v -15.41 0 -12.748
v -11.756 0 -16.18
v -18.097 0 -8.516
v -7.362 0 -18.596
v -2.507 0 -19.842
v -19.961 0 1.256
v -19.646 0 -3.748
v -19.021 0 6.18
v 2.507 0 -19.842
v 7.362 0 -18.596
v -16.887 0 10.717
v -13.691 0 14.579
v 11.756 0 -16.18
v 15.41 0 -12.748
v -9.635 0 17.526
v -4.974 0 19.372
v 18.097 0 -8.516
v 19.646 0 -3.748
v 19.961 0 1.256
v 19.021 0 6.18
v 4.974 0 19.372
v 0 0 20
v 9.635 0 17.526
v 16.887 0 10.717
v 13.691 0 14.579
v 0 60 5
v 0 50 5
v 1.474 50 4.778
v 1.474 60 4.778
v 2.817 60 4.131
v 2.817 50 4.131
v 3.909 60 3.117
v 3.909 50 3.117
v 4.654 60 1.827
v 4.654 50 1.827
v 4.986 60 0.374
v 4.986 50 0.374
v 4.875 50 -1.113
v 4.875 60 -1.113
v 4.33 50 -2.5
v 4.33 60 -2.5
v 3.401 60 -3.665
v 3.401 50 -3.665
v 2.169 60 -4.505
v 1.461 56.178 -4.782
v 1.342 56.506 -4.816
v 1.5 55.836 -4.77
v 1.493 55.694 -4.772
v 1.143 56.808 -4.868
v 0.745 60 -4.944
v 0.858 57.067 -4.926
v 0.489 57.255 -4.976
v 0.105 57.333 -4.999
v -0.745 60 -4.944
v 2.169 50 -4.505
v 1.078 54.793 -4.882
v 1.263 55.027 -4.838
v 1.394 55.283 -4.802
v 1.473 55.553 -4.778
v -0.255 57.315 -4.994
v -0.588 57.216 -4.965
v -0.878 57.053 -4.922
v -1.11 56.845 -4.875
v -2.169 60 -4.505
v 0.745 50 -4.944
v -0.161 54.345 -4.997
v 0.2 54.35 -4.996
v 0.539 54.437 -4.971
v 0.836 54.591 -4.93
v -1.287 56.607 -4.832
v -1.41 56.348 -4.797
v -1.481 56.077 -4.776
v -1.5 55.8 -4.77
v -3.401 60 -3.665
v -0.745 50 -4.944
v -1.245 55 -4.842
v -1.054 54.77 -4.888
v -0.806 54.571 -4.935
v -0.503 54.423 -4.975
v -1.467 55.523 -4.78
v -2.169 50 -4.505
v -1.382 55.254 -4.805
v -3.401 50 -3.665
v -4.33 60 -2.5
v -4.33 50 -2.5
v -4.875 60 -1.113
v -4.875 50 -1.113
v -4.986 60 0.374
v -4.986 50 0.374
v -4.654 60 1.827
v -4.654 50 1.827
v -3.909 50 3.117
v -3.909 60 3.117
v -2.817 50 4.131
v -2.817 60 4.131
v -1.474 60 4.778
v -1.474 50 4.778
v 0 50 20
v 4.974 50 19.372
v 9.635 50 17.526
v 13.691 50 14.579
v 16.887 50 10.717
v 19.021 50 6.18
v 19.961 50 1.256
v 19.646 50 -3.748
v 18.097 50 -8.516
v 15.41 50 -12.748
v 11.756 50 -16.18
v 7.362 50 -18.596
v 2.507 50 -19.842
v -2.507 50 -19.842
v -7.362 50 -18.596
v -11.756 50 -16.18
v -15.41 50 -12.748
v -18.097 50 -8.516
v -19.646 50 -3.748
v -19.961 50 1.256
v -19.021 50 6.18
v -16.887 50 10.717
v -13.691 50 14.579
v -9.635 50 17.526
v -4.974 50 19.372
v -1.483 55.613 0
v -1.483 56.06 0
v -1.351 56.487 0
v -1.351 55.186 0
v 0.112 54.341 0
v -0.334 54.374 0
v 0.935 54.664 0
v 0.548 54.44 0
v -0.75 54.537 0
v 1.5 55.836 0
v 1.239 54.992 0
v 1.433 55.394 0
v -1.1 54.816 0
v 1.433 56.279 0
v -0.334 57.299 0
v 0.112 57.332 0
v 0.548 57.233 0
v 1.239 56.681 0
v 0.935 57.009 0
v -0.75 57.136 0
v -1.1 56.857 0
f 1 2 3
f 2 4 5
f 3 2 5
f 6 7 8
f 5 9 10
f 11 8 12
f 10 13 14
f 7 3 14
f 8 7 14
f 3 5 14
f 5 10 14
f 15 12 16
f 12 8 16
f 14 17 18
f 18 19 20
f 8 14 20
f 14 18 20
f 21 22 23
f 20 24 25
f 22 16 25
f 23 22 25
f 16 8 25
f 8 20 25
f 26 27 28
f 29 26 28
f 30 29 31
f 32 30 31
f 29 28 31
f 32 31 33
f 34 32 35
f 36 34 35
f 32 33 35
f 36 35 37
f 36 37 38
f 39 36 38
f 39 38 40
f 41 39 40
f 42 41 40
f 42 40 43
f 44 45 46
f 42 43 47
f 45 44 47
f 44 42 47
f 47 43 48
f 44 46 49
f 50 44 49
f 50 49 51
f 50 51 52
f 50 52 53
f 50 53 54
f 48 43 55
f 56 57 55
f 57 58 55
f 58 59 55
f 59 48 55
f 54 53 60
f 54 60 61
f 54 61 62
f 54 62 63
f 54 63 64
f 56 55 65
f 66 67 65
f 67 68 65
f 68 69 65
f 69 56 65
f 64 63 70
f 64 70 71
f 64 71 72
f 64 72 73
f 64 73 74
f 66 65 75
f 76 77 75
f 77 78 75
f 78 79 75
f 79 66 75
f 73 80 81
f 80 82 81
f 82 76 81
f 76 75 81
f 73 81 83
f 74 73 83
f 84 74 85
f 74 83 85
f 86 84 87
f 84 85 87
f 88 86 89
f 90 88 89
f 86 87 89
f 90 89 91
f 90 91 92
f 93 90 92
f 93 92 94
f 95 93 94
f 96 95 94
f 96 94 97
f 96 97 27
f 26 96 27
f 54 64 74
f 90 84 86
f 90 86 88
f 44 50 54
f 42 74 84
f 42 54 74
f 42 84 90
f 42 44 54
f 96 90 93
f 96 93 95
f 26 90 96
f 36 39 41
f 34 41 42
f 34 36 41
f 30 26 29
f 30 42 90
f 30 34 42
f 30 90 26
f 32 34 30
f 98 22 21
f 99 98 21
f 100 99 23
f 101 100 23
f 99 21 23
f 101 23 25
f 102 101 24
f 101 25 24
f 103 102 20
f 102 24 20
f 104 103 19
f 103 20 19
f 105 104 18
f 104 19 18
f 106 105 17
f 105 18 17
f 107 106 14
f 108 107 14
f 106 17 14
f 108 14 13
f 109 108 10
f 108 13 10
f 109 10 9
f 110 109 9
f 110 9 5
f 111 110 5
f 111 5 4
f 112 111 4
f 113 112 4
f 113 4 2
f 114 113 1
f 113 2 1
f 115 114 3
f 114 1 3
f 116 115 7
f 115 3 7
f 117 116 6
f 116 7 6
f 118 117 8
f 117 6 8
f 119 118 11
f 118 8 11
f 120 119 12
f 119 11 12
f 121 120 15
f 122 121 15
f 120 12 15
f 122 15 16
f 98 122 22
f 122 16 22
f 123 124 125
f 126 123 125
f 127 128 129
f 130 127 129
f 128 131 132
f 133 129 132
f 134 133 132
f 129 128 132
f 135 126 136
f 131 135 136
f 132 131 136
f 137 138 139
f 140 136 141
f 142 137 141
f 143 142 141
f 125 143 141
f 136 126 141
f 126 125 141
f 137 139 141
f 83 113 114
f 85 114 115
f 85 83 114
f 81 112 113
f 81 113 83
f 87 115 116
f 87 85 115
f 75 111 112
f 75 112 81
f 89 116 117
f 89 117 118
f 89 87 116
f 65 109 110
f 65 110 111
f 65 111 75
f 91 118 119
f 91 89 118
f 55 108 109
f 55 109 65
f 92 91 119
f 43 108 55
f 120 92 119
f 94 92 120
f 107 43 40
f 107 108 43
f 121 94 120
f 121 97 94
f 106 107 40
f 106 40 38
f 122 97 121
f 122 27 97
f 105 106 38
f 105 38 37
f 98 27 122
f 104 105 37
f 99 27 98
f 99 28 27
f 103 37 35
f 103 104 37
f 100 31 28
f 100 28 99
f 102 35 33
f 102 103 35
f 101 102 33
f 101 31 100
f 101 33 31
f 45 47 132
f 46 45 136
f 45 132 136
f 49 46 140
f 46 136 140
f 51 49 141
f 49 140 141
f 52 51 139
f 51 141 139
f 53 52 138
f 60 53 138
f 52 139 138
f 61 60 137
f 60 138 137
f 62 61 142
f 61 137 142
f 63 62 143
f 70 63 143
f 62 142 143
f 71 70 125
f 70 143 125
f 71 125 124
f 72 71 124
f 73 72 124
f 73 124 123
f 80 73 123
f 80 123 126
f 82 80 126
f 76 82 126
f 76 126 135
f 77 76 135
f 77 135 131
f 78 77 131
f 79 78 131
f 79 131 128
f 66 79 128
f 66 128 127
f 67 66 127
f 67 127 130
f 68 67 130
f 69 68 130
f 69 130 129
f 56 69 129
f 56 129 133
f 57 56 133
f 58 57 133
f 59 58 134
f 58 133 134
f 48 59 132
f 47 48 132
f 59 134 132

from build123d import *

# Parameters (mm, degrees)
SKETCH1_R           = 20
BOSS_EXTRUDE1_DEPTH = 50
SKETCH2_R           = 5
BOSS_EXTRUDE2_DEPTH = 10
SKETCH3_R           = 1.5
CUT_EXTRUDE1_DEPTH  = 16


with BuildPart() as part:
    # Sketch1 → Boss-Extrude1 (new body)
    with BuildSketch(Plane(origin=(0, 0, 0), x_dir=(1, 0, 0), z_dir=(0, 1, 0))):
        with Locations(Location((0, 0, 0), (0, 0, 270))):
            Circle(SKETCH1_R)
    extrude(amount=BOSS_EXTRUDE1_DEPTH)

    # Sketch2 → Boss-Extrude2 (add)
    with BuildSketch(Plane(origin=(0, 50, 0), x_dir=(1, 0, 0), z_dir=(0, 1, 0))):
        with Locations(Location((0, 0, 0), (0, 0, 270))):
            Circle(SKETCH2_R)
    extrude(amount=BOSS_EXTRUDE2_DEPTH)

    # Sketch3 → Cut-Extrude1 (cut)
    with BuildSketch(Plane.XY):
        with Locations((0, 55.836490144)):
            Circle(SKETCH3_R)
    extrude(amount=-CUT_EXTRUDE1_DEPTH, mode=Mode.SUBTRACT)


solid = part.part
